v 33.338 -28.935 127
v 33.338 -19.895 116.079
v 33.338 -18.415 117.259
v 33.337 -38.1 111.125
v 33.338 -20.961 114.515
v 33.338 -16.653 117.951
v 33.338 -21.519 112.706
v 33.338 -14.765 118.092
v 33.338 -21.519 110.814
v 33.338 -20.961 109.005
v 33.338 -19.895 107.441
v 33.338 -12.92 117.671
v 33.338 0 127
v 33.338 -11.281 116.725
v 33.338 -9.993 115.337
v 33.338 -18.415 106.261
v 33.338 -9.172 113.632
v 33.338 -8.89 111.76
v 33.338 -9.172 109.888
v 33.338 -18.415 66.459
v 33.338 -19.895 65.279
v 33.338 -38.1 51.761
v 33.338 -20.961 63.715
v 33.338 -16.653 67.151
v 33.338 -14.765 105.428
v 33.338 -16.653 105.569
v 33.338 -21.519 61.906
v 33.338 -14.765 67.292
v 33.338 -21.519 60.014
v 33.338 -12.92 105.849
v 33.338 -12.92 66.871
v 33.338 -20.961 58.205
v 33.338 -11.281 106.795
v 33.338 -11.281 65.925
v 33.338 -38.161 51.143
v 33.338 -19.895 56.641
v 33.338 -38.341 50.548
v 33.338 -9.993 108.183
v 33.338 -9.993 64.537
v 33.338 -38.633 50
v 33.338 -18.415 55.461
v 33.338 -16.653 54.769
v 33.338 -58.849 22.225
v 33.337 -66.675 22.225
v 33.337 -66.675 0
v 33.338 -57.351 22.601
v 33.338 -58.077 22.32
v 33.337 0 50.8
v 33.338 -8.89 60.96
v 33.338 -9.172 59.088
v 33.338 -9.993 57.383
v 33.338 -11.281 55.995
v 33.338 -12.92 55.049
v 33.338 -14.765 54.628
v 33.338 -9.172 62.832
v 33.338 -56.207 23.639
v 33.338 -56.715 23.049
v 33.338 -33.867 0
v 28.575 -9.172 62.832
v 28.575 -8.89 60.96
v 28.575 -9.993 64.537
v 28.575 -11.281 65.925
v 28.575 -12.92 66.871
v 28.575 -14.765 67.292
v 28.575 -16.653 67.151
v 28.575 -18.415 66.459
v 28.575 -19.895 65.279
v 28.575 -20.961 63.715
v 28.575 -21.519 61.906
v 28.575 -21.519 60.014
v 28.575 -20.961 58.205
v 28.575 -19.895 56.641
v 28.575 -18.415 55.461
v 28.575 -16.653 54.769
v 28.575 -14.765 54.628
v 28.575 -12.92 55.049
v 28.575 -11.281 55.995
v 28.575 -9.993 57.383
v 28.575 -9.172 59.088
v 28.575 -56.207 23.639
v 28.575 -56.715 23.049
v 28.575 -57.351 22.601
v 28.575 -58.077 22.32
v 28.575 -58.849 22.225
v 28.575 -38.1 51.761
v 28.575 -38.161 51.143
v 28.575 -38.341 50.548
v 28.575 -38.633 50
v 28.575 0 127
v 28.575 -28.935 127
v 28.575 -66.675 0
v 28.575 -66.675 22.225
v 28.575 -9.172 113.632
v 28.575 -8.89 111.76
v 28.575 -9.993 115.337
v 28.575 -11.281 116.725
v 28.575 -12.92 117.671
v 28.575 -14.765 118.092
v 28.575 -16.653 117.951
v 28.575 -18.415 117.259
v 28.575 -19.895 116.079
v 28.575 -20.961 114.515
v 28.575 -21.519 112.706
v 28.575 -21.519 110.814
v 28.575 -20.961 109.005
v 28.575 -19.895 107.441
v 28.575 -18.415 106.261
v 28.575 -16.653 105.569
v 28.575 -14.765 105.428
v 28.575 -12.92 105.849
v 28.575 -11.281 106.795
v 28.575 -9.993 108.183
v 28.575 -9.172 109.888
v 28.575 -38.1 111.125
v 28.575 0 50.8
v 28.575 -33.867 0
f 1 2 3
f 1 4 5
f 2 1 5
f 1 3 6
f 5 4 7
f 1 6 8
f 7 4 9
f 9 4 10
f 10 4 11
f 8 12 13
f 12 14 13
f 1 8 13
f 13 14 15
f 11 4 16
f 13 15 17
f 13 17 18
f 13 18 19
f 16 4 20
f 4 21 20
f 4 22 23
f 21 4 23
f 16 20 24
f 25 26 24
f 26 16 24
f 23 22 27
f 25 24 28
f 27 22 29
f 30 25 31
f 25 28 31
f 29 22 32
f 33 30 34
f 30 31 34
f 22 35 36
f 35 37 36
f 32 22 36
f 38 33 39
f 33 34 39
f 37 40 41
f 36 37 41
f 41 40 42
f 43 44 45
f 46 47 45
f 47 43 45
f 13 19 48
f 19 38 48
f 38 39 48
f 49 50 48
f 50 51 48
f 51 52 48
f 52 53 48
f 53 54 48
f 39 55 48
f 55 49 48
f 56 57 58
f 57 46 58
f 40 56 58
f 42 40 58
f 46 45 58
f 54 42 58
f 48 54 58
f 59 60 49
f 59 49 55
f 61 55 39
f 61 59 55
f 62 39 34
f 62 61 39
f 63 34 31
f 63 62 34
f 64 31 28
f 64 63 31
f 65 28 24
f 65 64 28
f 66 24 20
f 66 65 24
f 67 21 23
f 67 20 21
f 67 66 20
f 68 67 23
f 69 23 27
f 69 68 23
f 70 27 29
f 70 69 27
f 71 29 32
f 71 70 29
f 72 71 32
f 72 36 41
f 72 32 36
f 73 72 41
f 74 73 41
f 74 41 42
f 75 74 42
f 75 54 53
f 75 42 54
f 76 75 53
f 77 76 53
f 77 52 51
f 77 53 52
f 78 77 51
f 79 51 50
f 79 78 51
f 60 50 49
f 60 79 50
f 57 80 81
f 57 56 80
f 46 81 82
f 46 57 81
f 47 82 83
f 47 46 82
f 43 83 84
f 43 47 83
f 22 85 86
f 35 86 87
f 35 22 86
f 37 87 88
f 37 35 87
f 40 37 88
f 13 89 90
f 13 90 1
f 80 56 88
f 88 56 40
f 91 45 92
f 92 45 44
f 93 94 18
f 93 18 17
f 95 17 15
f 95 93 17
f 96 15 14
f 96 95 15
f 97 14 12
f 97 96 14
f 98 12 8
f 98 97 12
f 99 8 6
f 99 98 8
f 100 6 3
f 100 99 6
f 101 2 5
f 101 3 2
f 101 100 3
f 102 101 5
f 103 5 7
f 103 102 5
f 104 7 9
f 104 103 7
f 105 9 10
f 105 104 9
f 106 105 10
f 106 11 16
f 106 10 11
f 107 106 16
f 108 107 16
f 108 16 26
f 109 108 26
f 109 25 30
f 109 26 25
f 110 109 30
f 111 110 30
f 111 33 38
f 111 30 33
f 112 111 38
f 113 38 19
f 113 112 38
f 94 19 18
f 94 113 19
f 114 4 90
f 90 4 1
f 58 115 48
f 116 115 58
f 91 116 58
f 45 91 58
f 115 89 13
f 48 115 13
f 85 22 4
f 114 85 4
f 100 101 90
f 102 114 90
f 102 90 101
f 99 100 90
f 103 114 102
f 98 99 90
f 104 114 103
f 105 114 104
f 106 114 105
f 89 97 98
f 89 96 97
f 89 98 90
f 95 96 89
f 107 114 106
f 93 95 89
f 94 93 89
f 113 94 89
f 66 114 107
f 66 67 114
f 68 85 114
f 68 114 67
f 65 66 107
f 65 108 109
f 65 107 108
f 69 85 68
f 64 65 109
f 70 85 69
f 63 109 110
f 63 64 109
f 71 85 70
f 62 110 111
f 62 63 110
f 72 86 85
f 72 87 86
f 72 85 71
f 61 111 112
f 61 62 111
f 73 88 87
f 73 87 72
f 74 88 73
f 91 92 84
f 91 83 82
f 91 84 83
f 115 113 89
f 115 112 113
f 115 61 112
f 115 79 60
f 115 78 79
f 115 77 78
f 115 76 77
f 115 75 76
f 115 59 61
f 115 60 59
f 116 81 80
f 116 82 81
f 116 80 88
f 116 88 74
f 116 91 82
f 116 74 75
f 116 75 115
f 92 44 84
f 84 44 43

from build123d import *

# Parameters (mm, degrees)
F0_W     = 4.7625
F0_H     = 127
F1_DEPTH = 127
F2_R     = 6.35
F3_DEPTH = 50.8
F4_R     = 3.175


with BuildPart() as f1:
    # F0 (on Top) → F1 (new body)
    with BuildSketch(Plane.XY):
        with Locations((30.95625, -63.5)):
            Rectangle(F0_W, F0_H)
    extrude(amount=F1_DEPTH)

    # F2 (on Right) → F3 (cut, symmetric)
    with BuildSketch(Plane.YZ):
        with Locations((-15.24, 111.76)):
            Circle(F2_R)
        with Locations((-15.24, 60.96)):
            Circle(F2_R)
        Polygon((0, 0), (0, 50.8), (-33.866667, 0), align=None)
        Polygon((-127, 0), (-66.675, 0), (-66.675, 22.225), (-57.15, 22.225), (-38.1, 50.8), (-38.1, 111.125), (-28.934564, 127), (-127, 127), align=None)
    extrude(amount=F3_DEPTH, both=True, mode=Mode.SUBTRACT)

    # F4
    f4_edges = [f1.edges().sort_by_distance(p)[0] for p in [
        (30.95625, -57.15, 22.225),
        (30.95625, -38.1, 50.8),
    ]]
    fillet(f4_edges, radius=F4_R)


solid = f1.part
